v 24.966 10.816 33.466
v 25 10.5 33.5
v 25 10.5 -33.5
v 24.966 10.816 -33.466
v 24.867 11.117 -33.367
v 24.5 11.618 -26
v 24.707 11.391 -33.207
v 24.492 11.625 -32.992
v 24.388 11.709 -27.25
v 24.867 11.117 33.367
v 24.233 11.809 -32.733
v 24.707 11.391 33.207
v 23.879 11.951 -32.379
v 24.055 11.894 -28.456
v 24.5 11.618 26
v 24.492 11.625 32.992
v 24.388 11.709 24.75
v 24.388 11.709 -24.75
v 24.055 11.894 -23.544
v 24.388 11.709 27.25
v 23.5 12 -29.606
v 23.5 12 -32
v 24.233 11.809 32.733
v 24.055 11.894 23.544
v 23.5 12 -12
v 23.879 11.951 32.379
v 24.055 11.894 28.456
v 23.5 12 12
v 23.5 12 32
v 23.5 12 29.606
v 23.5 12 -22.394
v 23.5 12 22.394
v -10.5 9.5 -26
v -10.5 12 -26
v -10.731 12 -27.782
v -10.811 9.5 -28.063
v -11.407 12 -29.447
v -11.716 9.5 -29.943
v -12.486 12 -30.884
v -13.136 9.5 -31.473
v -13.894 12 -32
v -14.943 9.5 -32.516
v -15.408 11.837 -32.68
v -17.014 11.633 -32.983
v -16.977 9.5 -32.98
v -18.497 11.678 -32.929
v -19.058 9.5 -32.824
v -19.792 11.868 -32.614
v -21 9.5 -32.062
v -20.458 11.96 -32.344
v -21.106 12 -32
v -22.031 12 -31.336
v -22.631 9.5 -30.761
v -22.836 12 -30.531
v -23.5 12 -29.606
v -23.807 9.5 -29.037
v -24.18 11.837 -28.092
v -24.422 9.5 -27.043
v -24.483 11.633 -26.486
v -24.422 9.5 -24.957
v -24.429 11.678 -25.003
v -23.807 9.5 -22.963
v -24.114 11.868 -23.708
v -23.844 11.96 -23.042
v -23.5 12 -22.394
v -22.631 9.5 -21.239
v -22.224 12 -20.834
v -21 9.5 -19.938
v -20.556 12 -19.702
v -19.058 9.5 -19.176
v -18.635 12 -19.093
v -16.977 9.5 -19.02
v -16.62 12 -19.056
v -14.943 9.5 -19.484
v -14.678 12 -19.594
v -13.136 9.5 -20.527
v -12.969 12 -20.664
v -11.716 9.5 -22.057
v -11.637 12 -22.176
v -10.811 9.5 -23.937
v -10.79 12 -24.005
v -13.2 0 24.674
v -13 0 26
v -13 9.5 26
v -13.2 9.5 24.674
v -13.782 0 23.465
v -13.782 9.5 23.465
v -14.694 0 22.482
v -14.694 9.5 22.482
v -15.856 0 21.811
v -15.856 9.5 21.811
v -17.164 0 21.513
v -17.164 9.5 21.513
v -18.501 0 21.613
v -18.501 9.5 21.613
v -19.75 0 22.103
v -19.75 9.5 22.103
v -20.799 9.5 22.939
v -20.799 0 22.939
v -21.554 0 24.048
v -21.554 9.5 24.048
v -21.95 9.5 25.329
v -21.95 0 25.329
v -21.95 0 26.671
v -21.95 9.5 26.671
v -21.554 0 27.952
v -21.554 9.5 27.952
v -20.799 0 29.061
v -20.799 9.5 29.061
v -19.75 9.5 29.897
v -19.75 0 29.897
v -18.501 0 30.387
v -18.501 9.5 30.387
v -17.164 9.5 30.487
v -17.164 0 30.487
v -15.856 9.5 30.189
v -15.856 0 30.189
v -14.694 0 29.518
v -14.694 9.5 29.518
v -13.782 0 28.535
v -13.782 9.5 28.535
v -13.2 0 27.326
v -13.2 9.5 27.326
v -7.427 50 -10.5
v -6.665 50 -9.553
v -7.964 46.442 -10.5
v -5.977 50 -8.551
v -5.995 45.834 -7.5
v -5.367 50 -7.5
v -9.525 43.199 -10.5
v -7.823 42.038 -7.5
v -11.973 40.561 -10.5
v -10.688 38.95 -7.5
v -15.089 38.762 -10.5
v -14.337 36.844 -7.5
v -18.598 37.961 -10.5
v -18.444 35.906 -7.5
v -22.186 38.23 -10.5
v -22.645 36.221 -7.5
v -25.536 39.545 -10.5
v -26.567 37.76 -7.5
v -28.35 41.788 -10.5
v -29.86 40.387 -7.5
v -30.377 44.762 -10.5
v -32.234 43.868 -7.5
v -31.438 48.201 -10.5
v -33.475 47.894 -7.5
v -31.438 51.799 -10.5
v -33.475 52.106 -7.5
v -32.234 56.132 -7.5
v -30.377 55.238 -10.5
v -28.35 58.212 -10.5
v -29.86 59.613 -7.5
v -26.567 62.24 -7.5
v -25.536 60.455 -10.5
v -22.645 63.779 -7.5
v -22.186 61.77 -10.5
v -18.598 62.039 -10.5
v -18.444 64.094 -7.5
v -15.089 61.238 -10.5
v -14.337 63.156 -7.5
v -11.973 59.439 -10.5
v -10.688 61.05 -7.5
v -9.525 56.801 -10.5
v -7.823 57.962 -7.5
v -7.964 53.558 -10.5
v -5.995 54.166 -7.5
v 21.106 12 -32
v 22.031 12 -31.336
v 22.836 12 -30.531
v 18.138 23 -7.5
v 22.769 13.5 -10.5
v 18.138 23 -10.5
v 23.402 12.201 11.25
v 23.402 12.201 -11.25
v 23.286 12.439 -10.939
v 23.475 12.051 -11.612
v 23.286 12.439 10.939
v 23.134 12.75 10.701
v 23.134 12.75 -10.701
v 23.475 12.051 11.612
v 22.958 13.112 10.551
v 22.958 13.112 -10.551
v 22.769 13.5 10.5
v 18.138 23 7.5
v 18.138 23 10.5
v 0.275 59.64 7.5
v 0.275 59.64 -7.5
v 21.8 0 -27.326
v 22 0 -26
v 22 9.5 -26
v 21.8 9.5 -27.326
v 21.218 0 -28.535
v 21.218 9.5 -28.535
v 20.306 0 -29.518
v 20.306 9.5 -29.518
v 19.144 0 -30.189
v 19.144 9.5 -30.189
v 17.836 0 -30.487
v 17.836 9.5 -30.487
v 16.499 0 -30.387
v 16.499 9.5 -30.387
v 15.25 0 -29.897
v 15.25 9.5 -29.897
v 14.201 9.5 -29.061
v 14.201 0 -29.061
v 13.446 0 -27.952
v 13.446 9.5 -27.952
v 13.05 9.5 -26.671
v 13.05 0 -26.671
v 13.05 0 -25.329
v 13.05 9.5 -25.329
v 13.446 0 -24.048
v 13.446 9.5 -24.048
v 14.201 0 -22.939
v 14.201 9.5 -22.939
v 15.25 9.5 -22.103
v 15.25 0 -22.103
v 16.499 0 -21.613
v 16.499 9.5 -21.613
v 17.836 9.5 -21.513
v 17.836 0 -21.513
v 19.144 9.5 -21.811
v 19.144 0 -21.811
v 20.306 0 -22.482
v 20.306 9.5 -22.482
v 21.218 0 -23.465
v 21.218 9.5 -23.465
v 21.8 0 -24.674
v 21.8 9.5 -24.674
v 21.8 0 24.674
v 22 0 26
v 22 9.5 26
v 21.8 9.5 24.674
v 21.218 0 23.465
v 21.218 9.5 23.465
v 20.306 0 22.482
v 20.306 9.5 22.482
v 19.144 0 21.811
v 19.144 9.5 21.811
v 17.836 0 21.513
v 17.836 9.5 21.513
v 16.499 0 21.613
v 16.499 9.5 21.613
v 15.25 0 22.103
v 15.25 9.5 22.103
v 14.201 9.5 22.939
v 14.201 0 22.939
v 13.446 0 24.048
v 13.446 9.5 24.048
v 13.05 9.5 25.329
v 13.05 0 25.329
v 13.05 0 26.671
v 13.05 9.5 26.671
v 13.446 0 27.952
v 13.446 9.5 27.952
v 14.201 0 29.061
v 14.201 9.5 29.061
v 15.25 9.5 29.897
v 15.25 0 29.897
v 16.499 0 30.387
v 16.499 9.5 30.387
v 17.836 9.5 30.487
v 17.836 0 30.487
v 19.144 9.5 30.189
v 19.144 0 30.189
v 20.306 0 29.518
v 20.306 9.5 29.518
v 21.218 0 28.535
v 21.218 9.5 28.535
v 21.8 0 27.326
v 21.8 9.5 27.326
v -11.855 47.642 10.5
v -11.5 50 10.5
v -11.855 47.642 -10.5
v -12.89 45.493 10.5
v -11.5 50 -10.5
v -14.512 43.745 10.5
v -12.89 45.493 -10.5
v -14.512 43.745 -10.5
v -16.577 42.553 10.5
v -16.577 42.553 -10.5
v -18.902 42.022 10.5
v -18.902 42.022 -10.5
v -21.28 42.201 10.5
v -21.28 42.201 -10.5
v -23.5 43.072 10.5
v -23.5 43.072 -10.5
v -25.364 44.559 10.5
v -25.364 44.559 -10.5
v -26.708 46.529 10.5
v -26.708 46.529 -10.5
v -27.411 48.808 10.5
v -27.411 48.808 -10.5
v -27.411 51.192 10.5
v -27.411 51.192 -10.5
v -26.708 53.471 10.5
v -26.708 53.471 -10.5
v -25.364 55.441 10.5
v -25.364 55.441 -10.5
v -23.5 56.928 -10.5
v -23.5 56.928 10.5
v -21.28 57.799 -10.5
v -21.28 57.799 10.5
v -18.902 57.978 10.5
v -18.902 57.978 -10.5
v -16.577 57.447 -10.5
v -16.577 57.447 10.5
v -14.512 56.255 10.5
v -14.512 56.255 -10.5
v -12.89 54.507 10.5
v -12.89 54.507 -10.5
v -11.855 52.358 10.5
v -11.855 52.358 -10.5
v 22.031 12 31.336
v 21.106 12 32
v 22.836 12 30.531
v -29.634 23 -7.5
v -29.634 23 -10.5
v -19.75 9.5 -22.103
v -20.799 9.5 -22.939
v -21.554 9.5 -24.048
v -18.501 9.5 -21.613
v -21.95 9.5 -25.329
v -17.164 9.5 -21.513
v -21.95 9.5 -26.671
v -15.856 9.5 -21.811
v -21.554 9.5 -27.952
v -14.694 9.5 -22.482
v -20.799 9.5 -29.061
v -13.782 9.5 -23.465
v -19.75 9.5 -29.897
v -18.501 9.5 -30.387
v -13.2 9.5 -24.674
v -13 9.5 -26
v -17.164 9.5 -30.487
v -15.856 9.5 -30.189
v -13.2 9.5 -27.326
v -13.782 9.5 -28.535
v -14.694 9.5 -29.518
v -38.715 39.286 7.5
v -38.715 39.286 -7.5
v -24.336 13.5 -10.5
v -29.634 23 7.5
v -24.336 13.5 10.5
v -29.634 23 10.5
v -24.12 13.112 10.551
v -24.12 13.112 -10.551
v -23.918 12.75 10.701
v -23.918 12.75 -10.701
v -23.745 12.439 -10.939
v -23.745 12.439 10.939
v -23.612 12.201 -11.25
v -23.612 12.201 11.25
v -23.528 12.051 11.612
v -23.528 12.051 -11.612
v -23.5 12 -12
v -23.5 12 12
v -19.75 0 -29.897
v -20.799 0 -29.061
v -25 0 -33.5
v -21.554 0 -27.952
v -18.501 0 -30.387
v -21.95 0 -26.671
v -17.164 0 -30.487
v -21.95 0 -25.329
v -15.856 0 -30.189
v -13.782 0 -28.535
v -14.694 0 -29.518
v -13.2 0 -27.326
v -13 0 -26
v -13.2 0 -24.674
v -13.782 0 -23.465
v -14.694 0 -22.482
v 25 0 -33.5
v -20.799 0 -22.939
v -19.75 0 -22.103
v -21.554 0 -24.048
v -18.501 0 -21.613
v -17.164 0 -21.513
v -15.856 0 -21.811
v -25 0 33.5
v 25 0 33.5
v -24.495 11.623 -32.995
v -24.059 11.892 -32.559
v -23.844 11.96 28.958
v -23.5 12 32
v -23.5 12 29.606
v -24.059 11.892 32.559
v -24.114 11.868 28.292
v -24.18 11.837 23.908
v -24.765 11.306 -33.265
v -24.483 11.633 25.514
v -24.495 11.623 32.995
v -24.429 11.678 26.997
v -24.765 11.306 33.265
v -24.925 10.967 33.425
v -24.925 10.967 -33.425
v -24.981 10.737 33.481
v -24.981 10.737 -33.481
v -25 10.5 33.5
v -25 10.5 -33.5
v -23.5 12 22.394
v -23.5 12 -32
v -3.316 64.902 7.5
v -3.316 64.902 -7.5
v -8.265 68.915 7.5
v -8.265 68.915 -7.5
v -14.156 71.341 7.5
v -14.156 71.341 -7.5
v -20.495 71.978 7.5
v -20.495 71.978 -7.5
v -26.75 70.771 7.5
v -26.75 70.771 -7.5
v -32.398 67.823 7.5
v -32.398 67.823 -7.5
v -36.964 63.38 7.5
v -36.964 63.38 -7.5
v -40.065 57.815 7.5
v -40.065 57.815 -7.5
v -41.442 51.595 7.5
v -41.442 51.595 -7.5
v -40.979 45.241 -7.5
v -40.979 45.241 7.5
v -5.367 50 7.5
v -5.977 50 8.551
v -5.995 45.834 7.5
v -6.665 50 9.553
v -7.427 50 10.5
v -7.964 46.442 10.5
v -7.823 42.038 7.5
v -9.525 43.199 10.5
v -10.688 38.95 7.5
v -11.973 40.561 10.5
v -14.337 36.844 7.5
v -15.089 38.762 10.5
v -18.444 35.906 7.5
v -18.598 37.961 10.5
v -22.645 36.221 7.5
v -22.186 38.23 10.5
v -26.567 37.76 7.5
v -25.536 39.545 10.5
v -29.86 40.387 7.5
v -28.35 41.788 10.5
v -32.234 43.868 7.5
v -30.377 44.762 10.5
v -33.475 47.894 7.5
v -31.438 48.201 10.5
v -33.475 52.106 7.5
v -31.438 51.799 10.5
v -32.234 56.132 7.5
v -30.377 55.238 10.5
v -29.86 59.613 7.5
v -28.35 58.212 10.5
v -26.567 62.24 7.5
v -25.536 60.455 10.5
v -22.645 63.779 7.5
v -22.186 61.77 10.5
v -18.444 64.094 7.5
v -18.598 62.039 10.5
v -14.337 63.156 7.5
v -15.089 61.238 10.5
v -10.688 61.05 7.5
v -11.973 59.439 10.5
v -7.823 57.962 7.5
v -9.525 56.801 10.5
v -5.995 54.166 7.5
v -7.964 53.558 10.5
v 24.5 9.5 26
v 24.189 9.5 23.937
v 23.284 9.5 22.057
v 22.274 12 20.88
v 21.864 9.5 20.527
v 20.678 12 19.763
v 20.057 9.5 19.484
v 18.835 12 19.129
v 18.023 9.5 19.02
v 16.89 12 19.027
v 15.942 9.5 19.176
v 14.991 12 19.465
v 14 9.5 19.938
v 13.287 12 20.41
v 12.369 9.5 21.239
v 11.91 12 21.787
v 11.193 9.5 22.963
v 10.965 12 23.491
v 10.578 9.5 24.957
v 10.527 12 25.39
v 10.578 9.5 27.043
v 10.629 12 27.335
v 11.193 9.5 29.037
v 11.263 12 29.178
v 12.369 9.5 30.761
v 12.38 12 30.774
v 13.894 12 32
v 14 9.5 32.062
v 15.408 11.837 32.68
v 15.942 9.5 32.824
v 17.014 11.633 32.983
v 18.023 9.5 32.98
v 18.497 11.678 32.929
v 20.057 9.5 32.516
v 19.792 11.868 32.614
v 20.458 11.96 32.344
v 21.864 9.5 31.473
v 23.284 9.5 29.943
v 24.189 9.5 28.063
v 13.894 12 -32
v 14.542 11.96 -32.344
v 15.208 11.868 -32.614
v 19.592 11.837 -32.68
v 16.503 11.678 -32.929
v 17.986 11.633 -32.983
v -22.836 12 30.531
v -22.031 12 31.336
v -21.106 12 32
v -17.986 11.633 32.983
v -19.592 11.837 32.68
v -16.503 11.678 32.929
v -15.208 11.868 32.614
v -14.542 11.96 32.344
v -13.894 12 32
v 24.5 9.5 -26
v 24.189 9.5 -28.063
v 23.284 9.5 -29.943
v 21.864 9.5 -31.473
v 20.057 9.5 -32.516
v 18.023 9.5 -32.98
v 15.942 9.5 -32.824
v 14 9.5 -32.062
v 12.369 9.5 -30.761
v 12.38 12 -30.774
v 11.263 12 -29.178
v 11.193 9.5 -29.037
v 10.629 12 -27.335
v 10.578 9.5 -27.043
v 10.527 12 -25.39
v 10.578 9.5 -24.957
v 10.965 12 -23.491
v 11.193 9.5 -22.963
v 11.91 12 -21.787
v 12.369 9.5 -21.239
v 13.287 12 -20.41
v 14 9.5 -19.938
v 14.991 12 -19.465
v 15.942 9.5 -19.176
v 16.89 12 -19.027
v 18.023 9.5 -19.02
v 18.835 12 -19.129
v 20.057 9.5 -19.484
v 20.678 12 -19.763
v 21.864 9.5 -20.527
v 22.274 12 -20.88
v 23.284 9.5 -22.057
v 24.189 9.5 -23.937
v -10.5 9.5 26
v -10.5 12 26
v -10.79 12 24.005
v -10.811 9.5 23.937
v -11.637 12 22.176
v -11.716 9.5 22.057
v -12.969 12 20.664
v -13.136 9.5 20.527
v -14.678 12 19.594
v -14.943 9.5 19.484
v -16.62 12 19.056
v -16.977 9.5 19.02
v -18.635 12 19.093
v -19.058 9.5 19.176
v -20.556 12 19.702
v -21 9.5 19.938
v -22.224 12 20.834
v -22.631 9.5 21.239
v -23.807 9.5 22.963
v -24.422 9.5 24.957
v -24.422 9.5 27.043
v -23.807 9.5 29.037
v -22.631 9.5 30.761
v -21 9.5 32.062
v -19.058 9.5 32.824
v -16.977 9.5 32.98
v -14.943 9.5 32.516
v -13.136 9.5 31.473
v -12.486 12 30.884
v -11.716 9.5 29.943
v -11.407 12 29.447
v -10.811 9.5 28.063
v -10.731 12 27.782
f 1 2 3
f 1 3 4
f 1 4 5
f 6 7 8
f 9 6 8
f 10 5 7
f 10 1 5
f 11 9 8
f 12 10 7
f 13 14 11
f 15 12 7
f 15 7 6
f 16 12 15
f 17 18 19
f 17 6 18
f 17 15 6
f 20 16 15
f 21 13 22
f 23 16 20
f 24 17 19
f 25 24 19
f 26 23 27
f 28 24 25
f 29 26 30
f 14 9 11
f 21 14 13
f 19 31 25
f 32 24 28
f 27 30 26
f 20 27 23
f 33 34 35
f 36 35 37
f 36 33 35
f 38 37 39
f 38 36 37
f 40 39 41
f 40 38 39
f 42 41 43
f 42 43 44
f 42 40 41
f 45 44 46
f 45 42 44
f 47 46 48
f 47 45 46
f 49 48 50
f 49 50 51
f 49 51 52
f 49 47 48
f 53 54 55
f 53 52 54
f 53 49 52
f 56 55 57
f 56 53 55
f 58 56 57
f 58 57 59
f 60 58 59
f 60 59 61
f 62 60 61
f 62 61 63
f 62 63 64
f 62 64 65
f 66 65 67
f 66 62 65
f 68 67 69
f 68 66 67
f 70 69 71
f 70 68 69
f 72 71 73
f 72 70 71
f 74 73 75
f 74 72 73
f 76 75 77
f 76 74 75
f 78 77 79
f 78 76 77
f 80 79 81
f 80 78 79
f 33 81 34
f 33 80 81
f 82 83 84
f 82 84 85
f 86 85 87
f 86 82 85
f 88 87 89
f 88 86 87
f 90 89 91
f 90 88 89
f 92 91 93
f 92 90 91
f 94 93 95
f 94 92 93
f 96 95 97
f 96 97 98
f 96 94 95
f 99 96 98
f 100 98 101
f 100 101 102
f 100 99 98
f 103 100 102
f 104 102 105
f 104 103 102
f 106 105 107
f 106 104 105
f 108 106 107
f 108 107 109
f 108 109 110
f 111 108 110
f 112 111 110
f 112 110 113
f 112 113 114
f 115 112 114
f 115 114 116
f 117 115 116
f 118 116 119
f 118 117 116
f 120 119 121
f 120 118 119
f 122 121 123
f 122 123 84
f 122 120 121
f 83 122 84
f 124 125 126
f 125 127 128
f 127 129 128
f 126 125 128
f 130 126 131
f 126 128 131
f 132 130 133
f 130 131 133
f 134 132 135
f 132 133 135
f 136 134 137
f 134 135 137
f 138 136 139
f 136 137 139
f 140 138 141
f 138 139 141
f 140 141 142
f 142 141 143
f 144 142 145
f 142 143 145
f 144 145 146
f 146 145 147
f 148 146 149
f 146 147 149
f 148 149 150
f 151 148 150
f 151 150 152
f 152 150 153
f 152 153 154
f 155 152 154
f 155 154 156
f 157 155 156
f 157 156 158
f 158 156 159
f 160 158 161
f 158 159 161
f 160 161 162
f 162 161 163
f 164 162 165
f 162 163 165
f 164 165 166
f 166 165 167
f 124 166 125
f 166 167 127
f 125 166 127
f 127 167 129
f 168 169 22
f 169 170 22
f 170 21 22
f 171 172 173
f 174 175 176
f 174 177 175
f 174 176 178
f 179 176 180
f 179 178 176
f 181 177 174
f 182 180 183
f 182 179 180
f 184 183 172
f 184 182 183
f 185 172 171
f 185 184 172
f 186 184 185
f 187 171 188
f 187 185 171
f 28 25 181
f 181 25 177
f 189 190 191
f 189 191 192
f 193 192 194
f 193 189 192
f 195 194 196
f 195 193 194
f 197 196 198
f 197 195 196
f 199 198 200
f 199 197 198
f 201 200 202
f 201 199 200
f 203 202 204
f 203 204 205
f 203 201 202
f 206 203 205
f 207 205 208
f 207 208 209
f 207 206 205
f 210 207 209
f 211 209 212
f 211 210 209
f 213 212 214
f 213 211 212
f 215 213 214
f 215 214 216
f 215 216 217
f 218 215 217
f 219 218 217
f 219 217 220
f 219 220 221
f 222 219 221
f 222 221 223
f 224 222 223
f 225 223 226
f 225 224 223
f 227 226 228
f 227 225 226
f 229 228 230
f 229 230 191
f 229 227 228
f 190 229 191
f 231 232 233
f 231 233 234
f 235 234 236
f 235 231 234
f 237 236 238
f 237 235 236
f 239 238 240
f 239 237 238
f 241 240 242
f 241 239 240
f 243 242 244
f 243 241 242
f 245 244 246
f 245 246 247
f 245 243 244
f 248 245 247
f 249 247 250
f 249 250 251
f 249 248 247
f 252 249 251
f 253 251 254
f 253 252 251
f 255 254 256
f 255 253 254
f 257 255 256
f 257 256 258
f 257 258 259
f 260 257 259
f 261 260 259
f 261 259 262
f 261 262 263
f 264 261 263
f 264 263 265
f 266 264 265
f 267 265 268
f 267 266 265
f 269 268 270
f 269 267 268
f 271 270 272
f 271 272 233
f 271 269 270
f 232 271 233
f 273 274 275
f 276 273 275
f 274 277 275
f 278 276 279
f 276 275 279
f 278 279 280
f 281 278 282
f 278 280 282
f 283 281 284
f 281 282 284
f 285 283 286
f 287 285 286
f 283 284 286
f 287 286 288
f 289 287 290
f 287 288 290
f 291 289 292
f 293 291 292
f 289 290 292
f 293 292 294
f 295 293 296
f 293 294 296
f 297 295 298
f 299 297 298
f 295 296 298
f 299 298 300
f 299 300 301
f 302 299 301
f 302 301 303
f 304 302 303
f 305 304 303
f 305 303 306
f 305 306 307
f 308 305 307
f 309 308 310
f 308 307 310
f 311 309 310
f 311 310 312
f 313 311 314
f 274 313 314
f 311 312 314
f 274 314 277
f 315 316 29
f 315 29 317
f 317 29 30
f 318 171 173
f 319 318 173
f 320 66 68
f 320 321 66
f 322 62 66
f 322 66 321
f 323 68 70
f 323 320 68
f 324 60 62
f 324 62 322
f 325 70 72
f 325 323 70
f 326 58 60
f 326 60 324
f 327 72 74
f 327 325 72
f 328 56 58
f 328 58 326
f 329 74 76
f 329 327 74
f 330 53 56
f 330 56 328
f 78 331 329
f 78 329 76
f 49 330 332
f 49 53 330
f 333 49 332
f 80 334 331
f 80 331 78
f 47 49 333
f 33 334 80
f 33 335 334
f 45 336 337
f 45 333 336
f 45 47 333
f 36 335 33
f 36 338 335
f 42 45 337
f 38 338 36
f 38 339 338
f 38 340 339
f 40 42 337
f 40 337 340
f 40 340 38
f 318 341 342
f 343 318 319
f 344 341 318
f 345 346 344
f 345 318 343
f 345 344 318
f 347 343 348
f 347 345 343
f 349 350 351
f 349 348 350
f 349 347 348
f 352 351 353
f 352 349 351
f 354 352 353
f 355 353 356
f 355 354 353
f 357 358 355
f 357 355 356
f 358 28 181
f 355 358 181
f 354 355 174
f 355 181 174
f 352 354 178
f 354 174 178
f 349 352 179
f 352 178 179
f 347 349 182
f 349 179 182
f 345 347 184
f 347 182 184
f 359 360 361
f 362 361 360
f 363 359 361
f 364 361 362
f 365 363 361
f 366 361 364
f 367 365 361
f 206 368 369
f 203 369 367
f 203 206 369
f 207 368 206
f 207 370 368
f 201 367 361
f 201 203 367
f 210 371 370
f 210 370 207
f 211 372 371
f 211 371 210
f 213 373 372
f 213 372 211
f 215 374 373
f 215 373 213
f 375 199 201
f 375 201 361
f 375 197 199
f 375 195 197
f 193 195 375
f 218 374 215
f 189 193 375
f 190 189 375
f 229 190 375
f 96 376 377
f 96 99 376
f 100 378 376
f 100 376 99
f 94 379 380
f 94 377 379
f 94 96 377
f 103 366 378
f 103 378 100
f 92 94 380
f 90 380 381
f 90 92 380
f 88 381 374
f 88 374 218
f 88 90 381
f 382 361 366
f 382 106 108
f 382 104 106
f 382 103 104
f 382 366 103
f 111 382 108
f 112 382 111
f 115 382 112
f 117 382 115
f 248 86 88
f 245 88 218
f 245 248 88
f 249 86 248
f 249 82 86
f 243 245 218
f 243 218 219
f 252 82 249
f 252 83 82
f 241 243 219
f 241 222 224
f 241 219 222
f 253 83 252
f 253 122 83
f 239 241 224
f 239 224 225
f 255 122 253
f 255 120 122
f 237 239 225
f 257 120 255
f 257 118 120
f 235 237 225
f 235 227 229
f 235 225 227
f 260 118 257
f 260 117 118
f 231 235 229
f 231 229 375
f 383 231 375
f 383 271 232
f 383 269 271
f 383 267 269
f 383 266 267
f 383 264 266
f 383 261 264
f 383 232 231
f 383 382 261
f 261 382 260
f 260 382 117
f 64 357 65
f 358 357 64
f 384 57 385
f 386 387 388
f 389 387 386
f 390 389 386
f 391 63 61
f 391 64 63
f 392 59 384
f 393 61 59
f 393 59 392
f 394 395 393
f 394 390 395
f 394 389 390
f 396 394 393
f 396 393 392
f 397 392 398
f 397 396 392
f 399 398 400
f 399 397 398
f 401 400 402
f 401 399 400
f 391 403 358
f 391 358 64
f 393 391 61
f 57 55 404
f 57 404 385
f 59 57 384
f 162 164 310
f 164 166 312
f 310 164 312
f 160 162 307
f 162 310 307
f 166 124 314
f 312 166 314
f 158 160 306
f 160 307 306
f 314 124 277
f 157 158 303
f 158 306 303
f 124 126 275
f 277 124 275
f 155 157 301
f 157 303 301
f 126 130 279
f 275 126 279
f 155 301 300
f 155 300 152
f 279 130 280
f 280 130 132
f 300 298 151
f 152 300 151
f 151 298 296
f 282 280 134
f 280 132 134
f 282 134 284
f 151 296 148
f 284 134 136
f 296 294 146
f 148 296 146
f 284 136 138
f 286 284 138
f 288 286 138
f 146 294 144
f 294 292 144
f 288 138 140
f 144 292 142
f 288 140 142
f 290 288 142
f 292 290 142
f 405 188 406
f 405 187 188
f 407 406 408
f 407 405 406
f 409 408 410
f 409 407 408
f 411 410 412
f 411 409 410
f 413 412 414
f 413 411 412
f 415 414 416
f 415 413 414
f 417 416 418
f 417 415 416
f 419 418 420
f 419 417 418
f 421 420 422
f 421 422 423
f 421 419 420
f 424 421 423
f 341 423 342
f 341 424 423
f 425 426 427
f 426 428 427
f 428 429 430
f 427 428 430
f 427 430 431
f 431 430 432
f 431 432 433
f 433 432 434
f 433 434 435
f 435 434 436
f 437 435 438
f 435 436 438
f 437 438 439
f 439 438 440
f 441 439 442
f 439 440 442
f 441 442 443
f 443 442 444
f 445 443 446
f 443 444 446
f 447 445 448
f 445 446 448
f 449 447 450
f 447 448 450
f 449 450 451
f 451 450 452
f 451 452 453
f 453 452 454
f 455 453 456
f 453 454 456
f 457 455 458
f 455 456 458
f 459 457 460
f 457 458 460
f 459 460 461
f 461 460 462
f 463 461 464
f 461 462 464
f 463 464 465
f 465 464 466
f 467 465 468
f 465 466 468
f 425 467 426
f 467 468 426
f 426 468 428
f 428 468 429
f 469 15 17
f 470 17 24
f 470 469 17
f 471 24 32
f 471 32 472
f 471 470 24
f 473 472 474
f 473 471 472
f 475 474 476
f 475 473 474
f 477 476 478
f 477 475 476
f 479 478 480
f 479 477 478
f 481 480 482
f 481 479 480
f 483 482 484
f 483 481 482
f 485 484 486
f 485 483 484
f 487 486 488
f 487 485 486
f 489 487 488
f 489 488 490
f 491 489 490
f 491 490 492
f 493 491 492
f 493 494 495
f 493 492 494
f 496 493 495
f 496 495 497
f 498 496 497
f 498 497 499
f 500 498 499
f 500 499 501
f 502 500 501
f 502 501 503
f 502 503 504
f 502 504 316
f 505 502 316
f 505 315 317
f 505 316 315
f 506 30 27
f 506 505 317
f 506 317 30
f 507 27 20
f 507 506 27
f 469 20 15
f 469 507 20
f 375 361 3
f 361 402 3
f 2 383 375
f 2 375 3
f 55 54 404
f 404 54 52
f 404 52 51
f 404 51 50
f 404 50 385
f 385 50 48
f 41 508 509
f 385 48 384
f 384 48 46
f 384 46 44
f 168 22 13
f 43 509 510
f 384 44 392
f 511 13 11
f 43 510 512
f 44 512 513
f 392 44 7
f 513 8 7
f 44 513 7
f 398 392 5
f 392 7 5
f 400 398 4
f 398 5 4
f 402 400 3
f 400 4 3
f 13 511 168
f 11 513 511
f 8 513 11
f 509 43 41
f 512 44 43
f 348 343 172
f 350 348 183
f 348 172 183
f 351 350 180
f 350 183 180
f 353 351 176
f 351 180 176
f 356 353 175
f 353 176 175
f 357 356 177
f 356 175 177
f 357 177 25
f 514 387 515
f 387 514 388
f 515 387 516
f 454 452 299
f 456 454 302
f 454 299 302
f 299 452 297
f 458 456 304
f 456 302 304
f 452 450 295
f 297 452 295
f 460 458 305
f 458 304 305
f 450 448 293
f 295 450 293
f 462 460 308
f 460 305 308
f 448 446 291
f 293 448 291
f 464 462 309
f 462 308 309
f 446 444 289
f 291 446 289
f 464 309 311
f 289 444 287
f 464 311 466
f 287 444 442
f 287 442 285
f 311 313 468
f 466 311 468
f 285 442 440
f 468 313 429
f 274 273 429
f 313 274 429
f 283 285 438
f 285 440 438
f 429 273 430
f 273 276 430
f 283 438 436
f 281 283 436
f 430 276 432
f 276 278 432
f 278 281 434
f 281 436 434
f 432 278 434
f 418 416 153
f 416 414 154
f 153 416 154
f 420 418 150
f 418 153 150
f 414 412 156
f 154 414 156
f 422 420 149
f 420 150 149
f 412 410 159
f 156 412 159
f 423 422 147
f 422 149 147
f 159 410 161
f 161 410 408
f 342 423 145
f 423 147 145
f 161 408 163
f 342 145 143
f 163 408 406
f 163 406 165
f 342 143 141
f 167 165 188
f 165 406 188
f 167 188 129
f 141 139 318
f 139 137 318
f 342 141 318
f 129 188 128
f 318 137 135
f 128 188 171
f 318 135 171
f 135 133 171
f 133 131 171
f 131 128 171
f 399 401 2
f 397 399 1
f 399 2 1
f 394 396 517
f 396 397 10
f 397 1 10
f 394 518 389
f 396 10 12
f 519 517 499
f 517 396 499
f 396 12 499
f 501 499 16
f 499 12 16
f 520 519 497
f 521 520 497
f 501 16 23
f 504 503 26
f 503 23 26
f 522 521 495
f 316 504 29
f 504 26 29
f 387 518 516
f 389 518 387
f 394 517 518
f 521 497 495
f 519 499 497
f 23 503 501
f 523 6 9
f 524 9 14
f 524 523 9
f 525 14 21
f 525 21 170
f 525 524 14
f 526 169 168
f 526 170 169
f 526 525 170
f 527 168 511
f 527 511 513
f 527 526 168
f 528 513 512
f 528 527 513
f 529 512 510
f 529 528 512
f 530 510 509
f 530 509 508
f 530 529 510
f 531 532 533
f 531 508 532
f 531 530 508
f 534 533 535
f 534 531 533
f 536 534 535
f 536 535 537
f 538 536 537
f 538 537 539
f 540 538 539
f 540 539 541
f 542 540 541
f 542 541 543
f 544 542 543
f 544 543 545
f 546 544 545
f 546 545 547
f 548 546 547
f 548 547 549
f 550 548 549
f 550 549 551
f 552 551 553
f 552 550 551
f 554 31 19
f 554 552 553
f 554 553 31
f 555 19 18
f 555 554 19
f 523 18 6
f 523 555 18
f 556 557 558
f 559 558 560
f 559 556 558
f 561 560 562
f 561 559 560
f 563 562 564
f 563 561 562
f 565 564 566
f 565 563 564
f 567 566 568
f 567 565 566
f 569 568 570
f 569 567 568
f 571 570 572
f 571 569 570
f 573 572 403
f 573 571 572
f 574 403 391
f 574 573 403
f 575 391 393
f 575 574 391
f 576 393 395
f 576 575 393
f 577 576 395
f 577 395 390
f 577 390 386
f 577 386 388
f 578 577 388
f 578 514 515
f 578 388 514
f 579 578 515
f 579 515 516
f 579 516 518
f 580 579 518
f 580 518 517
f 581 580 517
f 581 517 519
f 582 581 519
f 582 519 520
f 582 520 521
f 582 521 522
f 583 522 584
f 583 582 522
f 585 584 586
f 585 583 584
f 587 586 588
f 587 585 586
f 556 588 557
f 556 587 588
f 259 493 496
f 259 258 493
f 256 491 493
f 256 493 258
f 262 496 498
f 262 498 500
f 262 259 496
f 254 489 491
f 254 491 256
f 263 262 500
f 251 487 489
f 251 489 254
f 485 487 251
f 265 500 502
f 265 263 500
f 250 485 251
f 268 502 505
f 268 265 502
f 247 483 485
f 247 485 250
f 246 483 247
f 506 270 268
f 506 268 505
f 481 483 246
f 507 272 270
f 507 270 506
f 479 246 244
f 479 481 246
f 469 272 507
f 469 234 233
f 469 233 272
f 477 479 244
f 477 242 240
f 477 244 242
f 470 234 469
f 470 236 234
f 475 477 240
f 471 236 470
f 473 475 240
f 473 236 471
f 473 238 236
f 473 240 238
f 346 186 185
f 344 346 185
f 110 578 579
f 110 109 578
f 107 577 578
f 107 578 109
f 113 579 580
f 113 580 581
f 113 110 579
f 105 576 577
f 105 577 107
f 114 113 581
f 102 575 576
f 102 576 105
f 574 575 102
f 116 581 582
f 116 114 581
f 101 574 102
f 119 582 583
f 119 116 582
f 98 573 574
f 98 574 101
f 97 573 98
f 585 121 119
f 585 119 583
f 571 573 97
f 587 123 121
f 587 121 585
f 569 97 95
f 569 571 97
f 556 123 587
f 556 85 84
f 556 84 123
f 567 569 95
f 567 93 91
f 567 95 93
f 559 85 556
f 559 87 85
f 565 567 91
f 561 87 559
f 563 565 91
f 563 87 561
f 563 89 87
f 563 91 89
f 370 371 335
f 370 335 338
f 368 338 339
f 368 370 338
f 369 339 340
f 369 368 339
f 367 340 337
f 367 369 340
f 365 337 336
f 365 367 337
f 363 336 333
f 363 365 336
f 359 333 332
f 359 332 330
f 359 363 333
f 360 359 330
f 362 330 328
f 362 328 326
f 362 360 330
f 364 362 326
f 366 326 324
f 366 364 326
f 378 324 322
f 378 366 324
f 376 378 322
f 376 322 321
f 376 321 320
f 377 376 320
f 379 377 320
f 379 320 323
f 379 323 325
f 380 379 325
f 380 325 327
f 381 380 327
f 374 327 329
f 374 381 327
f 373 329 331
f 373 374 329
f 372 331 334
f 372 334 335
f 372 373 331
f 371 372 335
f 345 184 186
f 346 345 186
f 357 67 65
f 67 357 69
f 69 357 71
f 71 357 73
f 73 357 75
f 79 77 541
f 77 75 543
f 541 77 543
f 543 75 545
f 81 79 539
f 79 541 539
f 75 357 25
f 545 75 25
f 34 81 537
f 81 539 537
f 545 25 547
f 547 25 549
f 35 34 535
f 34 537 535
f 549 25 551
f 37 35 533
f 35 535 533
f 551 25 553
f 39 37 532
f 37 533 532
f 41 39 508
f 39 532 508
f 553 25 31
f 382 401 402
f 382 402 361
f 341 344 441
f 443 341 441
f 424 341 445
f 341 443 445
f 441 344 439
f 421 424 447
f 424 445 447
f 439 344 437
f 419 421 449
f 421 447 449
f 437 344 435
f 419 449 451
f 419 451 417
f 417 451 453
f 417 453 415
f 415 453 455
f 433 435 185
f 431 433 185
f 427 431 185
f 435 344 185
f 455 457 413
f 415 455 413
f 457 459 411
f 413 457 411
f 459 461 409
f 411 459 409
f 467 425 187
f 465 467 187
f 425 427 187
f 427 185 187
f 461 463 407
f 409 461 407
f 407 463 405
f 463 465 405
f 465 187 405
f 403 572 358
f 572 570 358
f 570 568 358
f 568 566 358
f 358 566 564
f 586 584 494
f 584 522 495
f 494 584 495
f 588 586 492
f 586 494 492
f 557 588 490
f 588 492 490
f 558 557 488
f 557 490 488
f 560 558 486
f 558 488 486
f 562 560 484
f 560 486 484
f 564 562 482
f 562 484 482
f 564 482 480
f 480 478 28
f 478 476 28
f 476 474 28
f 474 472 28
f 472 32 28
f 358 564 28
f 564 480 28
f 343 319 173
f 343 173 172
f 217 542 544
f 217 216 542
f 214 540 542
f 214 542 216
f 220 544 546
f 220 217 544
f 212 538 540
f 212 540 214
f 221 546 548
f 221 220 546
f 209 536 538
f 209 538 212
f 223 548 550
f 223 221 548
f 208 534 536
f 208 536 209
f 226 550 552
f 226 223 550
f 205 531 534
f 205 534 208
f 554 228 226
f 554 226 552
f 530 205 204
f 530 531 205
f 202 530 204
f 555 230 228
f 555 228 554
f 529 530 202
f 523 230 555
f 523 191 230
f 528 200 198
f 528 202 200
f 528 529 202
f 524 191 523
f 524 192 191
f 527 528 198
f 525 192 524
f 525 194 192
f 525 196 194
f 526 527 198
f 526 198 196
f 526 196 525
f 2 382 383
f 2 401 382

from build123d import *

# Parameters (mm, degrees)
BOSS_EXTRUDE1_DEPTH      = 33.5
BOSS_EXTRUDE1_DEPTH_BACK = 33.5
CUT_EXTRUDE1_DEPTH       = 67
CUT_EXTRUDE1_DEPTH_BACK  = 67
SKETCH4_W                = 8
SKETCH4_H                = 32


with BuildPart() as part:
    # Sketch1 → Boss-Extrude1 (new, two sides: drawn at the far end of the back side and taken through both)
    with BuildSketch(Plane.XY.offset(-BOSS_EXTRUDE1_DEPTH_BACK)):
        with BuildLine():
            Line((-38.714708847, 39.285758826), (-23.5, 12))
            ThreePointArc((-23.5, 12), (-24.560660172, 11.560660172), (-25, 10.5))
            Line((-25, 10.5), (-25, 0))
            Line((-25, 0), (25, 0))
            Line((25, 0), (25, 10.5))
            ThreePointArc((25, 10.5), (24.560660172, 11.560660172), (23.5, 12))
            Line((23.5, 12), (0.275280899, 59.640449438))
            ThreePointArc((0.275280899, 59.640449438), (-29.68120414, 69.502386579), (-38.714708847, 39.285758826))
        make_face()
    extrude(amount=BOSS_EXTRUDE1_DEPTH + BOSS_EXTRUDE1_DEPTH_BACK)

    # Sketch2 → Cut-Extrude1 (cut, two sides: drawn at the far end of the back side and taken through both)
    with BuildSketch(Plane(origin=(0, 0, 0), x_dir=(0, 0, -1), z_dir=(1, 0, 0)).offset(-CUT_EXTRUDE1_DEPTH_BACK)):
        with BuildLine():
            Line((-67, 100), (-67, -1))
            Line((-67, -1), (-33.5, -1))
            Line((-33.5, -1), (-33.5, 10.5))
            ThreePointArc((-33.5, 10.5), (-33.060660172, 11.560660172), (-32, 12))
            Line((-32, 12), (-12, 12))
            ThreePointArc((-12, 12), (-10.939339828, 12.439339828), (-10.5, 13.5))
            Line((-10.5, 13.5), (-10.5, 23))
            Line((-10.5, 23), (-7.5, 23))
            Line((-7.5, 23), (-7.5, 73))
            Line((-7.5, 73), (7.5, 73))
            Line((7.5, 73), (7.5, 23))
            Line((7.5, 23), (10.5, 23))
            Line((10.5, 23), (10.5, 13.5))
            ThreePointArc((10.5, 13.5), (10.939339828, 12.439339828), (12, 12))
            Line((12, 12), (32, 12))
            ThreePointArc((32, 12), (33.060660172, 11.560660172), (33.5, 10.5))
            Line((33.5, 10.5), (33.5, -1))
            Line((33.5, -1), (67, -1))
            Line((67, -1), (67, 100))
            Line((67, 100), (-67, 100))
        make_face()
    extrude(amount=CUT_EXTRUDE1_DEPTH + CUT_EXTRUDE1_DEPTH_BACK, mode=Mode.SUBTRACT)

    # Sketch3 → Revolve1 (revolve)
    with BuildSketch(Plane(origin=(0, 50, 0), x_dir=(1, 0, 0), z_dir=(0, 1, 0))):
        with BuildLine():
            Line((-19.5, 10.5), (-7.427303532, 10.5))
            ThreePointArc((-7.427303532, 10.5), (-3.5, 0), (-7.427303532, -10.5))
            Line((-7.427303532, -10.5), (-19.5, -10.5))
            Line((-19.5, -10.5), (-19.5, 10.5))
        make_face()
    revolve(axis=Axis((-19.5, 50, 10.5), (0, 0, -1)))

    # Sketch4 → Cut-Revolve1 (revolve, cut)
    with BuildSketch(Plane(origin=(0, 50, 0), x_dir=(1, 0, 0), z_dir=(0, 1, 0))):
        with Locations((-15.5, 0)):
            Rectangle(SKETCH4_W, SKETCH4_H)
    revolve(axis=Axis((-19.5, 50, 16), (0, 0, -1)), mode=Mode.SUBTRACT)

    # Sketch5 → Cut-Revolve2 (revolve, cut)
    with BuildSketch(Plane.XY.offset(26)):
        Polygon((17.5, 13), (24.5, 13), (24.5, 9.5), (22, 9.5), (22, -1), (17.5, -1), align=None)
    revolve(axis=Axis((17.5, -1, 26), (0, 1, 0)), mode=Mode.SUBTRACT)

    # Sketch6 → Cut-Revolve3 (revolve, cut)
    with BuildSketch(Plane.XY.offset(26)):
        Polygon((-17.5, 13), (-10.5, 13), (-10.5, 9.5), (-13, 9.5), (-13, -1), (-17.5, -1), align=None)
    revolve(axis=Axis((-17.5, -1, 26), (0, 1, 0)), mode=Mode.SUBTRACT)

    # Sketch7 → Cut-Revolve4 (revolve, cut)
    with BuildSketch(Plane.XY.offset(-26)):
        Polygon((-17.5, 13), (-10.5, 13), (-10.5, 9.5), (-13, 9.5), (-13, -1), (-17.5, -1), align=None)
    revolve(axis=Axis((-17.5, -1, -26), (0, 1, 0)), mode=Mode.SUBTRACT)

    # Sketch8 → Cut-Revolve5 (revolve, cut)
    with BuildSketch(Plane.XY.offset(-26)):
        Polygon((17.5, 13), (24.5, 13), (24.5, 9.5), (22, 9.5), (22, -1), (17.5, -1), align=None)
    revolve(axis=Axis((17.5, -1, -26), (0, 1, 0)), mode=Mode.SUBTRACT)


solid = part.part
